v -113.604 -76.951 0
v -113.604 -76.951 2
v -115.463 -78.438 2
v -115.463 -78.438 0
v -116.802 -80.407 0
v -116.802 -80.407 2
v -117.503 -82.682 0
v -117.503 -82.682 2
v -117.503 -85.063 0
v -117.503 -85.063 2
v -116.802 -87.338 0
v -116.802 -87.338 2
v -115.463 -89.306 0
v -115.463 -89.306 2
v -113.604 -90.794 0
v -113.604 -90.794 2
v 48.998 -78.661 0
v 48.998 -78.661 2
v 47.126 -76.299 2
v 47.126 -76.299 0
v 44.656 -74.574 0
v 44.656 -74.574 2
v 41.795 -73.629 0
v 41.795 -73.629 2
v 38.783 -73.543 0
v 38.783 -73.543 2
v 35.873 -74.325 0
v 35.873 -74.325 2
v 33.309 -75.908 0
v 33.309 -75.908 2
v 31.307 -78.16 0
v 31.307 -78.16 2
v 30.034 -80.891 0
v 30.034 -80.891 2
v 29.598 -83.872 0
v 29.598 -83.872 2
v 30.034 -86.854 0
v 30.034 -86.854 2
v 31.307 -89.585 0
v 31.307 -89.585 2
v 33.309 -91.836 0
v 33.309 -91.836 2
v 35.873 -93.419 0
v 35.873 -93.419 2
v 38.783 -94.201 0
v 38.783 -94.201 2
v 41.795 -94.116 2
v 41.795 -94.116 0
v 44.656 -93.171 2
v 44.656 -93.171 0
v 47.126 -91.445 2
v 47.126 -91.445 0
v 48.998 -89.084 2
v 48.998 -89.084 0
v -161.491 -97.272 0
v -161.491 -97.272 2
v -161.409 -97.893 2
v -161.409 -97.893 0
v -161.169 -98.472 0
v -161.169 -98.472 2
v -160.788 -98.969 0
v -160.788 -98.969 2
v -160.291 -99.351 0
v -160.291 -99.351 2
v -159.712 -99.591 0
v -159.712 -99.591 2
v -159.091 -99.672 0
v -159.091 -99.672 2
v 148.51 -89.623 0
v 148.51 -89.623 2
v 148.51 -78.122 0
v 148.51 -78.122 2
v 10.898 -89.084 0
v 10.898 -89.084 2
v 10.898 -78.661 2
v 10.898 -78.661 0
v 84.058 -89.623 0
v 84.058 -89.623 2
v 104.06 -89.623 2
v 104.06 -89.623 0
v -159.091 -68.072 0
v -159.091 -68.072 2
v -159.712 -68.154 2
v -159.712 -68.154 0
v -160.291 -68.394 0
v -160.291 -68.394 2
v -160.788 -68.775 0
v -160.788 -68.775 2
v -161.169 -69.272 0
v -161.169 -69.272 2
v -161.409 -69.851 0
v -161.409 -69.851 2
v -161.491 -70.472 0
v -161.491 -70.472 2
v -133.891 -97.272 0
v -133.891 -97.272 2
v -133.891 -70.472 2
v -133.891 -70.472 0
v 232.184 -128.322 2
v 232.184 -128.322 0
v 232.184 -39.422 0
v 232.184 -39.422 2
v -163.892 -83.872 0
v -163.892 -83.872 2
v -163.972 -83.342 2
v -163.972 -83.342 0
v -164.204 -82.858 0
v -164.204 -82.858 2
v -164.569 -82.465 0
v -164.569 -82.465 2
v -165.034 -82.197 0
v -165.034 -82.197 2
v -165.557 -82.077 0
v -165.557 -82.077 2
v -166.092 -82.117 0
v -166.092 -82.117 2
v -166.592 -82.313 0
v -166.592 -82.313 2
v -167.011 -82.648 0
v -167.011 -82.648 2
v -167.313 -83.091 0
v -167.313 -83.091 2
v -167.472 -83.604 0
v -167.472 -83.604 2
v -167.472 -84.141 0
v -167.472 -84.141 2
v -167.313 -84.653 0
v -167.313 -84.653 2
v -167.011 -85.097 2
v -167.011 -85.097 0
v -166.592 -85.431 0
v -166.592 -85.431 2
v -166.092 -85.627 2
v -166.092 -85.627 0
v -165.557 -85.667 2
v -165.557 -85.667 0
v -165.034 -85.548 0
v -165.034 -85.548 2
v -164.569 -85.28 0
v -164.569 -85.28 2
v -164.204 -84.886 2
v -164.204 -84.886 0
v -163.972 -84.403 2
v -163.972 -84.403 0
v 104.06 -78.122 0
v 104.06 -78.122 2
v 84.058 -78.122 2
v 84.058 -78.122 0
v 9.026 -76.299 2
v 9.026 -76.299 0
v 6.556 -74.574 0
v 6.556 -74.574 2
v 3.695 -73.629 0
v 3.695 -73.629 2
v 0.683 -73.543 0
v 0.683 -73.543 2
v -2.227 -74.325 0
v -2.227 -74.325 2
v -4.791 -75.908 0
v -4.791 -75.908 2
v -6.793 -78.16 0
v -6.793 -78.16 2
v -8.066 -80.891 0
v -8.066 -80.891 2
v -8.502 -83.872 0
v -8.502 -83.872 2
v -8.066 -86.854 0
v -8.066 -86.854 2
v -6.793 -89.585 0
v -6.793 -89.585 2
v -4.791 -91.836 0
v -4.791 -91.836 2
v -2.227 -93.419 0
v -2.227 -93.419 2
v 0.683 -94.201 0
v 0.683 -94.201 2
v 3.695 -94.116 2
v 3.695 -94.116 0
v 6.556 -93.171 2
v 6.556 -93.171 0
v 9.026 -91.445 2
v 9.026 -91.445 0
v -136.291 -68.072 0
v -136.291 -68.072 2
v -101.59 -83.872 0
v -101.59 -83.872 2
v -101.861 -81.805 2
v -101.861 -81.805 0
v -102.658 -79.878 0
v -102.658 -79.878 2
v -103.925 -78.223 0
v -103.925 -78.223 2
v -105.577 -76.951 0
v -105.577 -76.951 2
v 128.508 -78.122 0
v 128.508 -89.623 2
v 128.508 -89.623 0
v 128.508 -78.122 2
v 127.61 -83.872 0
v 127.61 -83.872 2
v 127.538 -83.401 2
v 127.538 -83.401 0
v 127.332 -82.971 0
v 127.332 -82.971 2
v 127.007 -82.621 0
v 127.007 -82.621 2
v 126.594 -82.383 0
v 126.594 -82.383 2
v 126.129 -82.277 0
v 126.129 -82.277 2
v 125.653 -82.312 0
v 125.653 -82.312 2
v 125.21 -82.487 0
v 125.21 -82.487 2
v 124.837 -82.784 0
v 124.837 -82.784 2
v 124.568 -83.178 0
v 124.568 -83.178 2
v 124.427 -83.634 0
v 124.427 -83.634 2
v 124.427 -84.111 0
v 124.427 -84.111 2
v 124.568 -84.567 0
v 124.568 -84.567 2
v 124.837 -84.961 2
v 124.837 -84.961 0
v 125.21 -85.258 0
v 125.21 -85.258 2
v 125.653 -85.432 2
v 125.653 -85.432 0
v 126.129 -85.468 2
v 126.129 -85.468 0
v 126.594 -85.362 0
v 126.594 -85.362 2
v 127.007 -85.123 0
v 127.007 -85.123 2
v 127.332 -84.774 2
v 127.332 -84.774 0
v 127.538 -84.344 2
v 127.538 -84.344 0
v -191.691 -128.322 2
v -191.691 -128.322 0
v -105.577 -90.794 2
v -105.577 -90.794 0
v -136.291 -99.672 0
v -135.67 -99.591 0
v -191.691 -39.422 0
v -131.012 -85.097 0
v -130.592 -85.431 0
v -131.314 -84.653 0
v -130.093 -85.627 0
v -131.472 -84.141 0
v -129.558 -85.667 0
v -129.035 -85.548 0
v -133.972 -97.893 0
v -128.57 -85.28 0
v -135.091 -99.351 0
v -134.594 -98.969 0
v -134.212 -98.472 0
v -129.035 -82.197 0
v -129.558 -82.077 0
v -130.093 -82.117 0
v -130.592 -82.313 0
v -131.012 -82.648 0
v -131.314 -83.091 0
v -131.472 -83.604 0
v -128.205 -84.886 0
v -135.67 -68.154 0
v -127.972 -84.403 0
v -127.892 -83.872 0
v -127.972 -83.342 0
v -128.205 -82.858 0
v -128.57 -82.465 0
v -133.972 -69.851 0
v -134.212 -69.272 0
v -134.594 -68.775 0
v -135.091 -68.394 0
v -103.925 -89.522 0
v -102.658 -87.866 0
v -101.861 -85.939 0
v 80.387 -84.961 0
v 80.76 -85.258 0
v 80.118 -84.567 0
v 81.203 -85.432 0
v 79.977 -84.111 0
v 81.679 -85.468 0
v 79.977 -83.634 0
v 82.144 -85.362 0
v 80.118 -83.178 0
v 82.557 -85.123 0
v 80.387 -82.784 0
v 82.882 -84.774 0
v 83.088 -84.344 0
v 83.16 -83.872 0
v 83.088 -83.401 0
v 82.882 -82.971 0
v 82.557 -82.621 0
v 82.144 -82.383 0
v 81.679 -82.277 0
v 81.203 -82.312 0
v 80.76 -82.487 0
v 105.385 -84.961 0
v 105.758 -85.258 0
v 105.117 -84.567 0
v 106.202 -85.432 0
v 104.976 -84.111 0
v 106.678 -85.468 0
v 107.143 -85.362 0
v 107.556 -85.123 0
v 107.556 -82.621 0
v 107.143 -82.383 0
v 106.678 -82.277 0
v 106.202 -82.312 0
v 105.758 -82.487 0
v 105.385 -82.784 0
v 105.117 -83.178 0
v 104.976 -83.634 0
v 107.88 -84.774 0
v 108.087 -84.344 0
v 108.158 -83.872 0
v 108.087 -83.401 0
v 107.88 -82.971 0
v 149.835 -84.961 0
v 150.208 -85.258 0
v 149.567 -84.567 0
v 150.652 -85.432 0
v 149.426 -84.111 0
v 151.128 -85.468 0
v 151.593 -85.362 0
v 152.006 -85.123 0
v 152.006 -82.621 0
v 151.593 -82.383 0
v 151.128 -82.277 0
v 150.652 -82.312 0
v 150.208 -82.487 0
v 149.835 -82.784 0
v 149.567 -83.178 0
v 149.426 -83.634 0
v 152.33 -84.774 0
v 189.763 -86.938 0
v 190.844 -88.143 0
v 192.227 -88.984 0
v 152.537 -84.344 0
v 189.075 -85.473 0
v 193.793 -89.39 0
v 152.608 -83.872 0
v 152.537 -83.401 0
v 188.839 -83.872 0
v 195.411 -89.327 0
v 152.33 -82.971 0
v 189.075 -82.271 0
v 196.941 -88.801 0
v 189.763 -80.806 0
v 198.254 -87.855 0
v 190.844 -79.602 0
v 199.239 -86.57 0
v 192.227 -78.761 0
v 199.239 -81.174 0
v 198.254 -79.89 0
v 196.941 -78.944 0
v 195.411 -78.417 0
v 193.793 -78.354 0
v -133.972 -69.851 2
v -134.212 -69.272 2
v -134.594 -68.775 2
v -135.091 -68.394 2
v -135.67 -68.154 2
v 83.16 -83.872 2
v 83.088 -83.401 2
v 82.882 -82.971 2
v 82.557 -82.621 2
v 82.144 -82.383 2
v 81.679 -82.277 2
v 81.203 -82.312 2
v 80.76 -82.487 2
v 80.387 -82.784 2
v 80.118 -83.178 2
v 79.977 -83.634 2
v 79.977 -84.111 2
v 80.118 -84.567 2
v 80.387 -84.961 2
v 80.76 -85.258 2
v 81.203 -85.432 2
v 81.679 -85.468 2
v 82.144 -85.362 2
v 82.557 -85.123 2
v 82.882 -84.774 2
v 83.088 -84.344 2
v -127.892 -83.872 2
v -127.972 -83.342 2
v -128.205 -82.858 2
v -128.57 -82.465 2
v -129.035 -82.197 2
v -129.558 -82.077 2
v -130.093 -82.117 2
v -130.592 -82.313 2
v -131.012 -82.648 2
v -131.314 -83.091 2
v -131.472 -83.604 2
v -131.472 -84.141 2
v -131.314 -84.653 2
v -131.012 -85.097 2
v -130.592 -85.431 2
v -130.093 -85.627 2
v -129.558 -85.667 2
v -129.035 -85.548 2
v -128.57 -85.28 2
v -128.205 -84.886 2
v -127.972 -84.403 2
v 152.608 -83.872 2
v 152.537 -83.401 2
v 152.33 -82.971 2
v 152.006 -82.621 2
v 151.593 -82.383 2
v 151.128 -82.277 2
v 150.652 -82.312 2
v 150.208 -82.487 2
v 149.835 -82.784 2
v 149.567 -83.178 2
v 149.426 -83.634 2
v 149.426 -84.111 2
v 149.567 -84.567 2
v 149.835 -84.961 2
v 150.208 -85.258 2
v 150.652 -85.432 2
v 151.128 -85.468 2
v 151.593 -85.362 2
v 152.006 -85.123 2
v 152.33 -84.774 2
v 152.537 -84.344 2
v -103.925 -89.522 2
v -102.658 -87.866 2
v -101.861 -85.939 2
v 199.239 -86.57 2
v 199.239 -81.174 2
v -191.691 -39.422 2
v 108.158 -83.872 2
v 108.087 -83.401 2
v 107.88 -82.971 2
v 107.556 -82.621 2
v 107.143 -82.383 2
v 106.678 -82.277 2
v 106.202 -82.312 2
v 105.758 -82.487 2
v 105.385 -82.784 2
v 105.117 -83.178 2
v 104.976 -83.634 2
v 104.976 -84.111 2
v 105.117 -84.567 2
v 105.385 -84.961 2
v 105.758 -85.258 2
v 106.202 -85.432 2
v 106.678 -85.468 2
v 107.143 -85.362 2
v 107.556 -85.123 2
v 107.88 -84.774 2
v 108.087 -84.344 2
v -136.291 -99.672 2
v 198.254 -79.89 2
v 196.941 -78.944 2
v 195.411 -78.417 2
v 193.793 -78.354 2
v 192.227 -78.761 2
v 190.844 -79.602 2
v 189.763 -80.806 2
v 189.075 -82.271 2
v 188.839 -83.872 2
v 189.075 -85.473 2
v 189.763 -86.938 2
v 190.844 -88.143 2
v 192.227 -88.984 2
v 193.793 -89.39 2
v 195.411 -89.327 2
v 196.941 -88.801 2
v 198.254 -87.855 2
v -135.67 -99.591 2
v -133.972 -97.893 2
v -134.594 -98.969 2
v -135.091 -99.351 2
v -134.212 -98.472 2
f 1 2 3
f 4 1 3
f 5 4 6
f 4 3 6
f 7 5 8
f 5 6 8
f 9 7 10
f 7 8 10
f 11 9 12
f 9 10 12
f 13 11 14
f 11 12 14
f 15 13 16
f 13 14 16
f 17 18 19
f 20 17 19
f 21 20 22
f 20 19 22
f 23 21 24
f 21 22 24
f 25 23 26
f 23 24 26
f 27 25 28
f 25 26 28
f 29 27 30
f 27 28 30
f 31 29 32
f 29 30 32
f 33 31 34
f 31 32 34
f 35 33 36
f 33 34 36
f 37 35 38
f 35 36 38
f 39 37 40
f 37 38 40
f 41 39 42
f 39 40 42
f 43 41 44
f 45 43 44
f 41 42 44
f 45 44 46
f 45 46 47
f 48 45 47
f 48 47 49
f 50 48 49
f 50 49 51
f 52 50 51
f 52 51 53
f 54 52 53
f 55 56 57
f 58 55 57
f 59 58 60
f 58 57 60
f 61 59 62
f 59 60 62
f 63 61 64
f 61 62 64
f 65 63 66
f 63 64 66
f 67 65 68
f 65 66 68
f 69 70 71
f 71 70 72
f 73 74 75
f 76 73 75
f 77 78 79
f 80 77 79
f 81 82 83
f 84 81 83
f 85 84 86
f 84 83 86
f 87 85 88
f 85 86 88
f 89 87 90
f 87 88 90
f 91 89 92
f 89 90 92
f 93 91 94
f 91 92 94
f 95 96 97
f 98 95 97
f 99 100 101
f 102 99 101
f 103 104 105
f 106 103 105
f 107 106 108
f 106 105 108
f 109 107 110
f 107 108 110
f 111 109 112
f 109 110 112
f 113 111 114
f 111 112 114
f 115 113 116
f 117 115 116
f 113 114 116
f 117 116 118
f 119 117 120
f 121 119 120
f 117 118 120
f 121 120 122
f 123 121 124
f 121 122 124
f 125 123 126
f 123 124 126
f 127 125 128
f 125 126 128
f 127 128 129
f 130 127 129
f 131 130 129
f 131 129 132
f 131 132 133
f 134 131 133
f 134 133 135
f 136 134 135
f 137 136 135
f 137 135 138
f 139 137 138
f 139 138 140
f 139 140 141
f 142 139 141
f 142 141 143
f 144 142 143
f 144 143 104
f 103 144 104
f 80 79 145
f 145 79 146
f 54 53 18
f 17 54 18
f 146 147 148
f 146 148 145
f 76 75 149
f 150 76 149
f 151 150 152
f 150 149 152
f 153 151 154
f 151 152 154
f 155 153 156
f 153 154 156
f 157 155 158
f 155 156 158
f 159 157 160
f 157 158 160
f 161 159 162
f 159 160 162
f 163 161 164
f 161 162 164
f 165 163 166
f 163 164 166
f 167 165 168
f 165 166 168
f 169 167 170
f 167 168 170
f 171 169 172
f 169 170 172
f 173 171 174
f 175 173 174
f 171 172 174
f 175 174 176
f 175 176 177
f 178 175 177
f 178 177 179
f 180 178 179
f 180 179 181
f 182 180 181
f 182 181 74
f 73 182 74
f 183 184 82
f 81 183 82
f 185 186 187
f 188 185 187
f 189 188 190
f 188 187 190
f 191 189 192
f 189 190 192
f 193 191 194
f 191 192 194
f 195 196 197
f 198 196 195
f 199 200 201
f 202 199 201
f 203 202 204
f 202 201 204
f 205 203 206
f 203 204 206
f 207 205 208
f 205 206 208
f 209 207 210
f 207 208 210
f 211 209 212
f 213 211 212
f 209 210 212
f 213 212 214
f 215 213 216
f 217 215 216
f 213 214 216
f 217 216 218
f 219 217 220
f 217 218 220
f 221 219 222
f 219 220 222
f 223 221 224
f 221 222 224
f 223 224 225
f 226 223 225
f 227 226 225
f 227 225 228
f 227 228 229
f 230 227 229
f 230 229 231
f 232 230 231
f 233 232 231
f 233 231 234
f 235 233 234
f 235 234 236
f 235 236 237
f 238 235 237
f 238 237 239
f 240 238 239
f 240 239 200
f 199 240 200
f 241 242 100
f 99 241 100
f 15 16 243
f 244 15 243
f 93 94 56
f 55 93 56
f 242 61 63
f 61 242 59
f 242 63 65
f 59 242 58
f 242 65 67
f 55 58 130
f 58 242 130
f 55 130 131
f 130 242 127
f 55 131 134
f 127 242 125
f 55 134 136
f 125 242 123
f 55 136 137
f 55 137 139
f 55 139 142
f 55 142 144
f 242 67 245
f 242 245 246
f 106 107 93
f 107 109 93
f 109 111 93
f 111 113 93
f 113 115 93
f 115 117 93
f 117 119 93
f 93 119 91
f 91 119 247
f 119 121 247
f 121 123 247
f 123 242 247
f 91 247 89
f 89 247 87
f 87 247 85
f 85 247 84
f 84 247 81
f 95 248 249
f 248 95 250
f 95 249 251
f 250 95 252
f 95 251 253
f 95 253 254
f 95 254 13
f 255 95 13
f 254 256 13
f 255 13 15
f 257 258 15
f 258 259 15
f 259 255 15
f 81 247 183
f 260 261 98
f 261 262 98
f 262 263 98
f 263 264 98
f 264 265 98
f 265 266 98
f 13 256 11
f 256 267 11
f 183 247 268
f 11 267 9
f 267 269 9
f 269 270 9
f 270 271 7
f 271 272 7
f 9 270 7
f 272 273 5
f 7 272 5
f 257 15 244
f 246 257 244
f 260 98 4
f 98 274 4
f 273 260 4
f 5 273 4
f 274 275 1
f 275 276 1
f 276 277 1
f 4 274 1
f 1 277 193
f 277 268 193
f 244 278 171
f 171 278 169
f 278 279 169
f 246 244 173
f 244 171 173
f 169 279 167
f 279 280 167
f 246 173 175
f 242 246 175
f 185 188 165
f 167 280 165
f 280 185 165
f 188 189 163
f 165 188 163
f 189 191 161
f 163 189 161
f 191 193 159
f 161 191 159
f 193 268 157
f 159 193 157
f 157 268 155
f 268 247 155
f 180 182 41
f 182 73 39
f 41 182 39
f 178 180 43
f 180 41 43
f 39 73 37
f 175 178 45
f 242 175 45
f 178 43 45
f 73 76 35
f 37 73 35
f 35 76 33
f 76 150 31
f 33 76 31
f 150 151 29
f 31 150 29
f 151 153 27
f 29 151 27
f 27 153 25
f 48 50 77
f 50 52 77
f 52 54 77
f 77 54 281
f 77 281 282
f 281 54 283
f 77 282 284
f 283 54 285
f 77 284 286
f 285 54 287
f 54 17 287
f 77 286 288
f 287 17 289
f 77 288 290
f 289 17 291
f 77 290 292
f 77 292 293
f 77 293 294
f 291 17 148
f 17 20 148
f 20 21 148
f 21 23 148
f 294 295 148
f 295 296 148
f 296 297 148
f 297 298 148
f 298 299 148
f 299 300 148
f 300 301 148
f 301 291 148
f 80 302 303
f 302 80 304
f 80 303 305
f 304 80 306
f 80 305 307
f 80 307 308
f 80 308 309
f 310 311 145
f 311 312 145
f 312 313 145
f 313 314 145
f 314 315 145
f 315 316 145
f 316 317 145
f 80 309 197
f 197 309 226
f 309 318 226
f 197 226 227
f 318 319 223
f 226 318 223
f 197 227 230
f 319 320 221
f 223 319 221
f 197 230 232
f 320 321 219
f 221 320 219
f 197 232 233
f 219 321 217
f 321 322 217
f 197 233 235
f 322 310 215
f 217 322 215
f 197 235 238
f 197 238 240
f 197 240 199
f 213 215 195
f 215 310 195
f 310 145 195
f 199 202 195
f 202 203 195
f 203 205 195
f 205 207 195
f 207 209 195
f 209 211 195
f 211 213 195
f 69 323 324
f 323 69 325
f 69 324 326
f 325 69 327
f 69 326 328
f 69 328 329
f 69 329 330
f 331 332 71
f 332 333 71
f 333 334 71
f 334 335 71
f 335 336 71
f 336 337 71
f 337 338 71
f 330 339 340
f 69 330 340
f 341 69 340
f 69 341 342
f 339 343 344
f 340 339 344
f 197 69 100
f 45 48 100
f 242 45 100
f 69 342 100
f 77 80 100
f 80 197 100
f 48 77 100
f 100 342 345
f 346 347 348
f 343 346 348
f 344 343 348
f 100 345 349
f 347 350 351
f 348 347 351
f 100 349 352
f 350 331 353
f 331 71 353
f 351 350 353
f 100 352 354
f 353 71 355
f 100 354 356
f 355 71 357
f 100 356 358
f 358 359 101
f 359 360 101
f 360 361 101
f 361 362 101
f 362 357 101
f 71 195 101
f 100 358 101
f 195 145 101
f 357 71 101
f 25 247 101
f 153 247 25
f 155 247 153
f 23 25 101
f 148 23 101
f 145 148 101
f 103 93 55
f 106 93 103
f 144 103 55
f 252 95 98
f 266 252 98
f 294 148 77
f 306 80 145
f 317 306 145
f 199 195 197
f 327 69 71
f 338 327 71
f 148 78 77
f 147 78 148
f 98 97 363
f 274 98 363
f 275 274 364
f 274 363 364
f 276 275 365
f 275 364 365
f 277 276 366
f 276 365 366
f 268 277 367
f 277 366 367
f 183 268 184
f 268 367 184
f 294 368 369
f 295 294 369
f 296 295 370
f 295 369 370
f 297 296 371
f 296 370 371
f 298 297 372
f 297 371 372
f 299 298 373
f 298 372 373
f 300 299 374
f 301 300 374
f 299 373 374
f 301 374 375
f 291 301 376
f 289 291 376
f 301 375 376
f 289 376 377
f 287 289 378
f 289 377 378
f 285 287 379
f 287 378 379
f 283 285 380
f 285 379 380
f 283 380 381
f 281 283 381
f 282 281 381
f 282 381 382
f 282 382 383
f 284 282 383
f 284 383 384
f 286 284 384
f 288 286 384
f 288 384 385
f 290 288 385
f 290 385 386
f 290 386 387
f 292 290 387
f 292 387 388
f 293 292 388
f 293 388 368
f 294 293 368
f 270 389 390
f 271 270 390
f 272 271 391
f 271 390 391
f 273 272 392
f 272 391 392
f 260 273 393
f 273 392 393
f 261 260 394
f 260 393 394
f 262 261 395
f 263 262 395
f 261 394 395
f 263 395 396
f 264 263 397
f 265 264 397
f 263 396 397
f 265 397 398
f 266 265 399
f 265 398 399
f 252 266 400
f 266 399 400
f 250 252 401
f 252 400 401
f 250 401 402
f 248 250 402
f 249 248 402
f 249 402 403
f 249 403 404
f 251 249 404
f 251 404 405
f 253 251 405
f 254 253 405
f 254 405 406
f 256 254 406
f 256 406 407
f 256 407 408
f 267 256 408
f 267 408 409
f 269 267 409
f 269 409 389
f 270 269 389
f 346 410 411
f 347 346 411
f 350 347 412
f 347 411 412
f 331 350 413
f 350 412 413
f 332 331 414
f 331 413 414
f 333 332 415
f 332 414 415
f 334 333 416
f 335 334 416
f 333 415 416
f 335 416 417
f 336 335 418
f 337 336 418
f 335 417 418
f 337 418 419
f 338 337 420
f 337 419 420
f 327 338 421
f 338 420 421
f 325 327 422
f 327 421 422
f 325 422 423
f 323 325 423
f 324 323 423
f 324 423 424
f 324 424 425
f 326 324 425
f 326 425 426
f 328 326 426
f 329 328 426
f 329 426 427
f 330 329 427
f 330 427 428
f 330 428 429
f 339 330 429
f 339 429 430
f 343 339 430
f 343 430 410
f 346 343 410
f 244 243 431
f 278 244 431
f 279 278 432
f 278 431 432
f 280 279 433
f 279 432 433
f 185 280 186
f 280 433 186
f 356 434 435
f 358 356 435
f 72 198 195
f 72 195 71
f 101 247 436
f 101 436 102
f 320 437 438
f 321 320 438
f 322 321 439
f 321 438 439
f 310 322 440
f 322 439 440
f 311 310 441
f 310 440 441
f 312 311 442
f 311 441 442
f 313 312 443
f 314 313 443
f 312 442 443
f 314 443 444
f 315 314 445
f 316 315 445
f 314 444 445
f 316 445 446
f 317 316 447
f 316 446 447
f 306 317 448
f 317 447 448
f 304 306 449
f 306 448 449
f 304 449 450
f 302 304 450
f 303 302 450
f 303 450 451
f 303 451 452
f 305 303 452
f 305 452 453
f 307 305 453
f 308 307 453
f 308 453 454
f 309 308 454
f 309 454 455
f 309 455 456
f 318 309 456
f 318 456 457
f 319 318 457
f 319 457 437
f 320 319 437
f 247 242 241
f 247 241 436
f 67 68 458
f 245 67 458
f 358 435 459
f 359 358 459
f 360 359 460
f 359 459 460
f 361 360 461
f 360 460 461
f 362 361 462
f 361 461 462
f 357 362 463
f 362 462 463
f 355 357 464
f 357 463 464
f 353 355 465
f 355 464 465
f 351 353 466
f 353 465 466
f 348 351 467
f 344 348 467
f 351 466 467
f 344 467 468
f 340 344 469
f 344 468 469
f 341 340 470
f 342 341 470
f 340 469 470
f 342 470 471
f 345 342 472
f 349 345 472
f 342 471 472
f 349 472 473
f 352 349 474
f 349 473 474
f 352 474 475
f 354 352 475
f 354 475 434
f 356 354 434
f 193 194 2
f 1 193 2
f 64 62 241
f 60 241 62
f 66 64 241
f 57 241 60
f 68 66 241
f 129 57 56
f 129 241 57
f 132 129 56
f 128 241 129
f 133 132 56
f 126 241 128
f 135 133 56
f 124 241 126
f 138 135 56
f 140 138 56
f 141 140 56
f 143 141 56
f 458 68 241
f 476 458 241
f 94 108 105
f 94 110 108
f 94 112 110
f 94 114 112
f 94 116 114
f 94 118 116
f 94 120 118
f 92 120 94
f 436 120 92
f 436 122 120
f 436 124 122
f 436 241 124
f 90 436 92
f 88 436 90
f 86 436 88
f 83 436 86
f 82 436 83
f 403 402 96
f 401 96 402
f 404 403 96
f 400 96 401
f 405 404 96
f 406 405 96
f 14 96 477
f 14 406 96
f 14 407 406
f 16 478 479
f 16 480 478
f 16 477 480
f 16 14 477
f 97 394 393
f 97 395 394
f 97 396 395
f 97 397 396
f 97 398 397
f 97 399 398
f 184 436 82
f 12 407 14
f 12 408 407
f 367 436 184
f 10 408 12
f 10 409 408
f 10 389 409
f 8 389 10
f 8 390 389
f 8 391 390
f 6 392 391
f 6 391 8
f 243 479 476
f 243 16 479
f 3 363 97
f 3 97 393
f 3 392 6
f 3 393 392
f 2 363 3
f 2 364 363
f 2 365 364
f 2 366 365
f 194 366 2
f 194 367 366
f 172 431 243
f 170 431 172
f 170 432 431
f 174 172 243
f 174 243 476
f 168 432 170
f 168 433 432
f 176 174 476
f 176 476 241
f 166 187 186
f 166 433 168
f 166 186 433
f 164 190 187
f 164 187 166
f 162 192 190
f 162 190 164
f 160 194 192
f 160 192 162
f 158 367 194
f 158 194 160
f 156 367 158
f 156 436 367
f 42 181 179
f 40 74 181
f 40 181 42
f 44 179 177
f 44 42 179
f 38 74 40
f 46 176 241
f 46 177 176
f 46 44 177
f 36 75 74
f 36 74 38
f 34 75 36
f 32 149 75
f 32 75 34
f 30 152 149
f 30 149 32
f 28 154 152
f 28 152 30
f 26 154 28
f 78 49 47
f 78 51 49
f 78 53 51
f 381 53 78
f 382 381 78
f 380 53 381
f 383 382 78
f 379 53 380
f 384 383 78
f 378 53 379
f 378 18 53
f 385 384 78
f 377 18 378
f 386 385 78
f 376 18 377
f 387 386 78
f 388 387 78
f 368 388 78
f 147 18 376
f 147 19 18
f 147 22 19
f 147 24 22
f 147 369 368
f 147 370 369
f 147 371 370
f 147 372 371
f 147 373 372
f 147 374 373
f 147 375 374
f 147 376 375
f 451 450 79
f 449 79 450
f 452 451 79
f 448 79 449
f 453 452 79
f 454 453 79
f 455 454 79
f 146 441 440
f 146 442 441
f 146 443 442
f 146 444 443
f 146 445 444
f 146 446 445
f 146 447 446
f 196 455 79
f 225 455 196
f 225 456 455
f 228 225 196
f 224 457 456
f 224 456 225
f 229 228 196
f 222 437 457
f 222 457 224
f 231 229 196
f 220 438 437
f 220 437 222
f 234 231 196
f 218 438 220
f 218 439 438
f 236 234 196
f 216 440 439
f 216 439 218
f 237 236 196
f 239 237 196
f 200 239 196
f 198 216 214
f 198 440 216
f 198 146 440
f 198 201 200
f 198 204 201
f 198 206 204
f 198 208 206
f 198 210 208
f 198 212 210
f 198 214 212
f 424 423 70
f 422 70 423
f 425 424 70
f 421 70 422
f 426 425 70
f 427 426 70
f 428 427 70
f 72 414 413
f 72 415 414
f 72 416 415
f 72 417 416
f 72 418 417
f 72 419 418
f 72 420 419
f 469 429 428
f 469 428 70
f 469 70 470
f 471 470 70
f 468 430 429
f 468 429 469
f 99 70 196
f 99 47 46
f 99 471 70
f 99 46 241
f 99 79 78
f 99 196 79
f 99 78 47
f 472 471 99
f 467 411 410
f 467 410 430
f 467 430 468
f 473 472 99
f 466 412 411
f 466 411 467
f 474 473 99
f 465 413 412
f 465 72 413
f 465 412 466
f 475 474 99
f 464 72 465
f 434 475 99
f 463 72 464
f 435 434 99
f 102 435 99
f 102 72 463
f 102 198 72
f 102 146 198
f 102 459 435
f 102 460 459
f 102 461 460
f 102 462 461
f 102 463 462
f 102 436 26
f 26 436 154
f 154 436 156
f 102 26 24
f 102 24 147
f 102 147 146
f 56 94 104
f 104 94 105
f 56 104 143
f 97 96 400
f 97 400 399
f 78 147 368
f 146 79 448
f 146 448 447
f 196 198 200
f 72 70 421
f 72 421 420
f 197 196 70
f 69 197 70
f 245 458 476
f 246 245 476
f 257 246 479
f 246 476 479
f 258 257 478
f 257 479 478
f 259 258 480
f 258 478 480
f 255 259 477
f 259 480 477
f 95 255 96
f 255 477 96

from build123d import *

# Parameters (mm, degrees)
F0_W     = 423.8752
F0_H     = 88.9
F1_DEPTH = 2
F2_R     = 1.8
F2_W     = 20.0025
F2_H     = 11.50112
F2_R_2   = 1.6
F3_DEPTH = 25.4


# Not quite as in the source:
# - a feature names something its author has since deleted; it is built from what else it names


with BuildPart() as f1:
    # F0 (on Top) → F1 (new body)
    with BuildSketch(Plane.XY):
        with Locations((20.2464647591, -83.8722900312)):
            Rectangle(F0_W, F0_H)
    extrude(amount=F1_DEPTH)

    # F2 (on face) → F3 (cut)
    with BuildSketch(Plane.XY.offset(2)):
        with Locations((-165.6916952409, -83.8722900312)):
            Circle(F2_R)
        with BuildLine():
            Line((-159.0907152409, -99.6722900312), (-136.2907152409, -99.6722900312))
            ThreePointArc((-136.2907152409, -99.6722900312), (-134.593658966, -98.9693463061), (-133.8907152409, -97.2722900312))
            Line((-133.8907152409, -97.2722900312), (-133.8907152409, -70.4722900312))
            ThreePointArc((-133.8907152409, -70.4722900312), (-134.593658966, -68.7752337564), (-136.2907152409, -68.0722900312))
            Line((-136.2907152409, -68.0722900312), (-159.0907152409, -68.0722900312))
            ThreePointArc((-159.0907152409, -68.0722900312), (-160.7877715157, -68.7752337564), (-161.4907152409, -70.4722900312))
            Line((-161.4907152409, -70.4722900312), (-161.4907152409, -97.2722900312))
            ThreePointArc((-161.4907152409, -97.2722900312), (-160.7877715157, -98.9693463061), (-159.0907152409, -99.6722900312))
        make_face()
        with Locations((-129.6922752409, -83.8722900312)):
            Circle(F2_R)
        with BuildLine():
            ThreePointArc((-105.5771334553, -90.7937900312), (-102.6578706275, -87.8662437824), (-101.5897152409, -83.8722900312))
            ThreePointArc((-101.5897152409, -83.8722900312), (-102.6578706275, -79.87833628), (-105.5771334553, -76.9507900312))
            Line((-105.5771334553, -76.9507900312), (-113.6042970265, -76.9507900312))
            ThreePointArc((-113.6042970265, -76.9507900312), (-117.5917152409, -83.8722900312), (-113.6042970265, -90.7937900312))
            Line((-113.6042970265, -90.7937900312), (-105.5771334553, -90.7937900312))
        make_face()
        with BuildLine():
            Line((10.8975047591, -89.0838157195), (10.8975047591, -78.6607643429))
            ThreePointArc((10.8975047591, -78.6607643429), (-8.5024952409, -83.8722900312), (10.8975047591, -89.0838157195))
        make_face()
        with BuildLine():
            Line((48.9975047591, -89.0838157195), (48.9975047591, -78.6607643429))
            ThreePointArc((48.9975047591, -78.6607643429), (29.5975047591, -83.8722900312), (48.9975047591, -89.0838157195))
        make_face()
        with BuildLine():
            Line((199.2388647591, -86.5704375439), (199.2388647591, -81.1741425186))
            ThreePointArc((199.2388647591, -81.1741425186), (188.8388647591, -83.8722900312), (199.2388647591, -86.5704375439))
        make_face()
        with Locations((94.0588647591, -83.8722900312)):
            Rectangle(F2_W, F2_H)
        with Locations((138.5088647591, -83.8722900312)):
            Rectangle(F2_W, F2_H)
        with Locations((106.5582047591, -83.8722900312)):
            Circle(F2_R_2)
        with Locations((81.5595247591, -83.8722900312)):
            Circle(F2_R_2)
        with Locations((126.0095247591, -83.8722900312)):
            Circle(F2_R_2)
        with Locations((151.0082047591, -83.8722900312)):
            Circle(F2_R_2)
    extrude(amount=-F3_DEPTH, mode=Mode.SUBTRACT)


solid = f1.part
